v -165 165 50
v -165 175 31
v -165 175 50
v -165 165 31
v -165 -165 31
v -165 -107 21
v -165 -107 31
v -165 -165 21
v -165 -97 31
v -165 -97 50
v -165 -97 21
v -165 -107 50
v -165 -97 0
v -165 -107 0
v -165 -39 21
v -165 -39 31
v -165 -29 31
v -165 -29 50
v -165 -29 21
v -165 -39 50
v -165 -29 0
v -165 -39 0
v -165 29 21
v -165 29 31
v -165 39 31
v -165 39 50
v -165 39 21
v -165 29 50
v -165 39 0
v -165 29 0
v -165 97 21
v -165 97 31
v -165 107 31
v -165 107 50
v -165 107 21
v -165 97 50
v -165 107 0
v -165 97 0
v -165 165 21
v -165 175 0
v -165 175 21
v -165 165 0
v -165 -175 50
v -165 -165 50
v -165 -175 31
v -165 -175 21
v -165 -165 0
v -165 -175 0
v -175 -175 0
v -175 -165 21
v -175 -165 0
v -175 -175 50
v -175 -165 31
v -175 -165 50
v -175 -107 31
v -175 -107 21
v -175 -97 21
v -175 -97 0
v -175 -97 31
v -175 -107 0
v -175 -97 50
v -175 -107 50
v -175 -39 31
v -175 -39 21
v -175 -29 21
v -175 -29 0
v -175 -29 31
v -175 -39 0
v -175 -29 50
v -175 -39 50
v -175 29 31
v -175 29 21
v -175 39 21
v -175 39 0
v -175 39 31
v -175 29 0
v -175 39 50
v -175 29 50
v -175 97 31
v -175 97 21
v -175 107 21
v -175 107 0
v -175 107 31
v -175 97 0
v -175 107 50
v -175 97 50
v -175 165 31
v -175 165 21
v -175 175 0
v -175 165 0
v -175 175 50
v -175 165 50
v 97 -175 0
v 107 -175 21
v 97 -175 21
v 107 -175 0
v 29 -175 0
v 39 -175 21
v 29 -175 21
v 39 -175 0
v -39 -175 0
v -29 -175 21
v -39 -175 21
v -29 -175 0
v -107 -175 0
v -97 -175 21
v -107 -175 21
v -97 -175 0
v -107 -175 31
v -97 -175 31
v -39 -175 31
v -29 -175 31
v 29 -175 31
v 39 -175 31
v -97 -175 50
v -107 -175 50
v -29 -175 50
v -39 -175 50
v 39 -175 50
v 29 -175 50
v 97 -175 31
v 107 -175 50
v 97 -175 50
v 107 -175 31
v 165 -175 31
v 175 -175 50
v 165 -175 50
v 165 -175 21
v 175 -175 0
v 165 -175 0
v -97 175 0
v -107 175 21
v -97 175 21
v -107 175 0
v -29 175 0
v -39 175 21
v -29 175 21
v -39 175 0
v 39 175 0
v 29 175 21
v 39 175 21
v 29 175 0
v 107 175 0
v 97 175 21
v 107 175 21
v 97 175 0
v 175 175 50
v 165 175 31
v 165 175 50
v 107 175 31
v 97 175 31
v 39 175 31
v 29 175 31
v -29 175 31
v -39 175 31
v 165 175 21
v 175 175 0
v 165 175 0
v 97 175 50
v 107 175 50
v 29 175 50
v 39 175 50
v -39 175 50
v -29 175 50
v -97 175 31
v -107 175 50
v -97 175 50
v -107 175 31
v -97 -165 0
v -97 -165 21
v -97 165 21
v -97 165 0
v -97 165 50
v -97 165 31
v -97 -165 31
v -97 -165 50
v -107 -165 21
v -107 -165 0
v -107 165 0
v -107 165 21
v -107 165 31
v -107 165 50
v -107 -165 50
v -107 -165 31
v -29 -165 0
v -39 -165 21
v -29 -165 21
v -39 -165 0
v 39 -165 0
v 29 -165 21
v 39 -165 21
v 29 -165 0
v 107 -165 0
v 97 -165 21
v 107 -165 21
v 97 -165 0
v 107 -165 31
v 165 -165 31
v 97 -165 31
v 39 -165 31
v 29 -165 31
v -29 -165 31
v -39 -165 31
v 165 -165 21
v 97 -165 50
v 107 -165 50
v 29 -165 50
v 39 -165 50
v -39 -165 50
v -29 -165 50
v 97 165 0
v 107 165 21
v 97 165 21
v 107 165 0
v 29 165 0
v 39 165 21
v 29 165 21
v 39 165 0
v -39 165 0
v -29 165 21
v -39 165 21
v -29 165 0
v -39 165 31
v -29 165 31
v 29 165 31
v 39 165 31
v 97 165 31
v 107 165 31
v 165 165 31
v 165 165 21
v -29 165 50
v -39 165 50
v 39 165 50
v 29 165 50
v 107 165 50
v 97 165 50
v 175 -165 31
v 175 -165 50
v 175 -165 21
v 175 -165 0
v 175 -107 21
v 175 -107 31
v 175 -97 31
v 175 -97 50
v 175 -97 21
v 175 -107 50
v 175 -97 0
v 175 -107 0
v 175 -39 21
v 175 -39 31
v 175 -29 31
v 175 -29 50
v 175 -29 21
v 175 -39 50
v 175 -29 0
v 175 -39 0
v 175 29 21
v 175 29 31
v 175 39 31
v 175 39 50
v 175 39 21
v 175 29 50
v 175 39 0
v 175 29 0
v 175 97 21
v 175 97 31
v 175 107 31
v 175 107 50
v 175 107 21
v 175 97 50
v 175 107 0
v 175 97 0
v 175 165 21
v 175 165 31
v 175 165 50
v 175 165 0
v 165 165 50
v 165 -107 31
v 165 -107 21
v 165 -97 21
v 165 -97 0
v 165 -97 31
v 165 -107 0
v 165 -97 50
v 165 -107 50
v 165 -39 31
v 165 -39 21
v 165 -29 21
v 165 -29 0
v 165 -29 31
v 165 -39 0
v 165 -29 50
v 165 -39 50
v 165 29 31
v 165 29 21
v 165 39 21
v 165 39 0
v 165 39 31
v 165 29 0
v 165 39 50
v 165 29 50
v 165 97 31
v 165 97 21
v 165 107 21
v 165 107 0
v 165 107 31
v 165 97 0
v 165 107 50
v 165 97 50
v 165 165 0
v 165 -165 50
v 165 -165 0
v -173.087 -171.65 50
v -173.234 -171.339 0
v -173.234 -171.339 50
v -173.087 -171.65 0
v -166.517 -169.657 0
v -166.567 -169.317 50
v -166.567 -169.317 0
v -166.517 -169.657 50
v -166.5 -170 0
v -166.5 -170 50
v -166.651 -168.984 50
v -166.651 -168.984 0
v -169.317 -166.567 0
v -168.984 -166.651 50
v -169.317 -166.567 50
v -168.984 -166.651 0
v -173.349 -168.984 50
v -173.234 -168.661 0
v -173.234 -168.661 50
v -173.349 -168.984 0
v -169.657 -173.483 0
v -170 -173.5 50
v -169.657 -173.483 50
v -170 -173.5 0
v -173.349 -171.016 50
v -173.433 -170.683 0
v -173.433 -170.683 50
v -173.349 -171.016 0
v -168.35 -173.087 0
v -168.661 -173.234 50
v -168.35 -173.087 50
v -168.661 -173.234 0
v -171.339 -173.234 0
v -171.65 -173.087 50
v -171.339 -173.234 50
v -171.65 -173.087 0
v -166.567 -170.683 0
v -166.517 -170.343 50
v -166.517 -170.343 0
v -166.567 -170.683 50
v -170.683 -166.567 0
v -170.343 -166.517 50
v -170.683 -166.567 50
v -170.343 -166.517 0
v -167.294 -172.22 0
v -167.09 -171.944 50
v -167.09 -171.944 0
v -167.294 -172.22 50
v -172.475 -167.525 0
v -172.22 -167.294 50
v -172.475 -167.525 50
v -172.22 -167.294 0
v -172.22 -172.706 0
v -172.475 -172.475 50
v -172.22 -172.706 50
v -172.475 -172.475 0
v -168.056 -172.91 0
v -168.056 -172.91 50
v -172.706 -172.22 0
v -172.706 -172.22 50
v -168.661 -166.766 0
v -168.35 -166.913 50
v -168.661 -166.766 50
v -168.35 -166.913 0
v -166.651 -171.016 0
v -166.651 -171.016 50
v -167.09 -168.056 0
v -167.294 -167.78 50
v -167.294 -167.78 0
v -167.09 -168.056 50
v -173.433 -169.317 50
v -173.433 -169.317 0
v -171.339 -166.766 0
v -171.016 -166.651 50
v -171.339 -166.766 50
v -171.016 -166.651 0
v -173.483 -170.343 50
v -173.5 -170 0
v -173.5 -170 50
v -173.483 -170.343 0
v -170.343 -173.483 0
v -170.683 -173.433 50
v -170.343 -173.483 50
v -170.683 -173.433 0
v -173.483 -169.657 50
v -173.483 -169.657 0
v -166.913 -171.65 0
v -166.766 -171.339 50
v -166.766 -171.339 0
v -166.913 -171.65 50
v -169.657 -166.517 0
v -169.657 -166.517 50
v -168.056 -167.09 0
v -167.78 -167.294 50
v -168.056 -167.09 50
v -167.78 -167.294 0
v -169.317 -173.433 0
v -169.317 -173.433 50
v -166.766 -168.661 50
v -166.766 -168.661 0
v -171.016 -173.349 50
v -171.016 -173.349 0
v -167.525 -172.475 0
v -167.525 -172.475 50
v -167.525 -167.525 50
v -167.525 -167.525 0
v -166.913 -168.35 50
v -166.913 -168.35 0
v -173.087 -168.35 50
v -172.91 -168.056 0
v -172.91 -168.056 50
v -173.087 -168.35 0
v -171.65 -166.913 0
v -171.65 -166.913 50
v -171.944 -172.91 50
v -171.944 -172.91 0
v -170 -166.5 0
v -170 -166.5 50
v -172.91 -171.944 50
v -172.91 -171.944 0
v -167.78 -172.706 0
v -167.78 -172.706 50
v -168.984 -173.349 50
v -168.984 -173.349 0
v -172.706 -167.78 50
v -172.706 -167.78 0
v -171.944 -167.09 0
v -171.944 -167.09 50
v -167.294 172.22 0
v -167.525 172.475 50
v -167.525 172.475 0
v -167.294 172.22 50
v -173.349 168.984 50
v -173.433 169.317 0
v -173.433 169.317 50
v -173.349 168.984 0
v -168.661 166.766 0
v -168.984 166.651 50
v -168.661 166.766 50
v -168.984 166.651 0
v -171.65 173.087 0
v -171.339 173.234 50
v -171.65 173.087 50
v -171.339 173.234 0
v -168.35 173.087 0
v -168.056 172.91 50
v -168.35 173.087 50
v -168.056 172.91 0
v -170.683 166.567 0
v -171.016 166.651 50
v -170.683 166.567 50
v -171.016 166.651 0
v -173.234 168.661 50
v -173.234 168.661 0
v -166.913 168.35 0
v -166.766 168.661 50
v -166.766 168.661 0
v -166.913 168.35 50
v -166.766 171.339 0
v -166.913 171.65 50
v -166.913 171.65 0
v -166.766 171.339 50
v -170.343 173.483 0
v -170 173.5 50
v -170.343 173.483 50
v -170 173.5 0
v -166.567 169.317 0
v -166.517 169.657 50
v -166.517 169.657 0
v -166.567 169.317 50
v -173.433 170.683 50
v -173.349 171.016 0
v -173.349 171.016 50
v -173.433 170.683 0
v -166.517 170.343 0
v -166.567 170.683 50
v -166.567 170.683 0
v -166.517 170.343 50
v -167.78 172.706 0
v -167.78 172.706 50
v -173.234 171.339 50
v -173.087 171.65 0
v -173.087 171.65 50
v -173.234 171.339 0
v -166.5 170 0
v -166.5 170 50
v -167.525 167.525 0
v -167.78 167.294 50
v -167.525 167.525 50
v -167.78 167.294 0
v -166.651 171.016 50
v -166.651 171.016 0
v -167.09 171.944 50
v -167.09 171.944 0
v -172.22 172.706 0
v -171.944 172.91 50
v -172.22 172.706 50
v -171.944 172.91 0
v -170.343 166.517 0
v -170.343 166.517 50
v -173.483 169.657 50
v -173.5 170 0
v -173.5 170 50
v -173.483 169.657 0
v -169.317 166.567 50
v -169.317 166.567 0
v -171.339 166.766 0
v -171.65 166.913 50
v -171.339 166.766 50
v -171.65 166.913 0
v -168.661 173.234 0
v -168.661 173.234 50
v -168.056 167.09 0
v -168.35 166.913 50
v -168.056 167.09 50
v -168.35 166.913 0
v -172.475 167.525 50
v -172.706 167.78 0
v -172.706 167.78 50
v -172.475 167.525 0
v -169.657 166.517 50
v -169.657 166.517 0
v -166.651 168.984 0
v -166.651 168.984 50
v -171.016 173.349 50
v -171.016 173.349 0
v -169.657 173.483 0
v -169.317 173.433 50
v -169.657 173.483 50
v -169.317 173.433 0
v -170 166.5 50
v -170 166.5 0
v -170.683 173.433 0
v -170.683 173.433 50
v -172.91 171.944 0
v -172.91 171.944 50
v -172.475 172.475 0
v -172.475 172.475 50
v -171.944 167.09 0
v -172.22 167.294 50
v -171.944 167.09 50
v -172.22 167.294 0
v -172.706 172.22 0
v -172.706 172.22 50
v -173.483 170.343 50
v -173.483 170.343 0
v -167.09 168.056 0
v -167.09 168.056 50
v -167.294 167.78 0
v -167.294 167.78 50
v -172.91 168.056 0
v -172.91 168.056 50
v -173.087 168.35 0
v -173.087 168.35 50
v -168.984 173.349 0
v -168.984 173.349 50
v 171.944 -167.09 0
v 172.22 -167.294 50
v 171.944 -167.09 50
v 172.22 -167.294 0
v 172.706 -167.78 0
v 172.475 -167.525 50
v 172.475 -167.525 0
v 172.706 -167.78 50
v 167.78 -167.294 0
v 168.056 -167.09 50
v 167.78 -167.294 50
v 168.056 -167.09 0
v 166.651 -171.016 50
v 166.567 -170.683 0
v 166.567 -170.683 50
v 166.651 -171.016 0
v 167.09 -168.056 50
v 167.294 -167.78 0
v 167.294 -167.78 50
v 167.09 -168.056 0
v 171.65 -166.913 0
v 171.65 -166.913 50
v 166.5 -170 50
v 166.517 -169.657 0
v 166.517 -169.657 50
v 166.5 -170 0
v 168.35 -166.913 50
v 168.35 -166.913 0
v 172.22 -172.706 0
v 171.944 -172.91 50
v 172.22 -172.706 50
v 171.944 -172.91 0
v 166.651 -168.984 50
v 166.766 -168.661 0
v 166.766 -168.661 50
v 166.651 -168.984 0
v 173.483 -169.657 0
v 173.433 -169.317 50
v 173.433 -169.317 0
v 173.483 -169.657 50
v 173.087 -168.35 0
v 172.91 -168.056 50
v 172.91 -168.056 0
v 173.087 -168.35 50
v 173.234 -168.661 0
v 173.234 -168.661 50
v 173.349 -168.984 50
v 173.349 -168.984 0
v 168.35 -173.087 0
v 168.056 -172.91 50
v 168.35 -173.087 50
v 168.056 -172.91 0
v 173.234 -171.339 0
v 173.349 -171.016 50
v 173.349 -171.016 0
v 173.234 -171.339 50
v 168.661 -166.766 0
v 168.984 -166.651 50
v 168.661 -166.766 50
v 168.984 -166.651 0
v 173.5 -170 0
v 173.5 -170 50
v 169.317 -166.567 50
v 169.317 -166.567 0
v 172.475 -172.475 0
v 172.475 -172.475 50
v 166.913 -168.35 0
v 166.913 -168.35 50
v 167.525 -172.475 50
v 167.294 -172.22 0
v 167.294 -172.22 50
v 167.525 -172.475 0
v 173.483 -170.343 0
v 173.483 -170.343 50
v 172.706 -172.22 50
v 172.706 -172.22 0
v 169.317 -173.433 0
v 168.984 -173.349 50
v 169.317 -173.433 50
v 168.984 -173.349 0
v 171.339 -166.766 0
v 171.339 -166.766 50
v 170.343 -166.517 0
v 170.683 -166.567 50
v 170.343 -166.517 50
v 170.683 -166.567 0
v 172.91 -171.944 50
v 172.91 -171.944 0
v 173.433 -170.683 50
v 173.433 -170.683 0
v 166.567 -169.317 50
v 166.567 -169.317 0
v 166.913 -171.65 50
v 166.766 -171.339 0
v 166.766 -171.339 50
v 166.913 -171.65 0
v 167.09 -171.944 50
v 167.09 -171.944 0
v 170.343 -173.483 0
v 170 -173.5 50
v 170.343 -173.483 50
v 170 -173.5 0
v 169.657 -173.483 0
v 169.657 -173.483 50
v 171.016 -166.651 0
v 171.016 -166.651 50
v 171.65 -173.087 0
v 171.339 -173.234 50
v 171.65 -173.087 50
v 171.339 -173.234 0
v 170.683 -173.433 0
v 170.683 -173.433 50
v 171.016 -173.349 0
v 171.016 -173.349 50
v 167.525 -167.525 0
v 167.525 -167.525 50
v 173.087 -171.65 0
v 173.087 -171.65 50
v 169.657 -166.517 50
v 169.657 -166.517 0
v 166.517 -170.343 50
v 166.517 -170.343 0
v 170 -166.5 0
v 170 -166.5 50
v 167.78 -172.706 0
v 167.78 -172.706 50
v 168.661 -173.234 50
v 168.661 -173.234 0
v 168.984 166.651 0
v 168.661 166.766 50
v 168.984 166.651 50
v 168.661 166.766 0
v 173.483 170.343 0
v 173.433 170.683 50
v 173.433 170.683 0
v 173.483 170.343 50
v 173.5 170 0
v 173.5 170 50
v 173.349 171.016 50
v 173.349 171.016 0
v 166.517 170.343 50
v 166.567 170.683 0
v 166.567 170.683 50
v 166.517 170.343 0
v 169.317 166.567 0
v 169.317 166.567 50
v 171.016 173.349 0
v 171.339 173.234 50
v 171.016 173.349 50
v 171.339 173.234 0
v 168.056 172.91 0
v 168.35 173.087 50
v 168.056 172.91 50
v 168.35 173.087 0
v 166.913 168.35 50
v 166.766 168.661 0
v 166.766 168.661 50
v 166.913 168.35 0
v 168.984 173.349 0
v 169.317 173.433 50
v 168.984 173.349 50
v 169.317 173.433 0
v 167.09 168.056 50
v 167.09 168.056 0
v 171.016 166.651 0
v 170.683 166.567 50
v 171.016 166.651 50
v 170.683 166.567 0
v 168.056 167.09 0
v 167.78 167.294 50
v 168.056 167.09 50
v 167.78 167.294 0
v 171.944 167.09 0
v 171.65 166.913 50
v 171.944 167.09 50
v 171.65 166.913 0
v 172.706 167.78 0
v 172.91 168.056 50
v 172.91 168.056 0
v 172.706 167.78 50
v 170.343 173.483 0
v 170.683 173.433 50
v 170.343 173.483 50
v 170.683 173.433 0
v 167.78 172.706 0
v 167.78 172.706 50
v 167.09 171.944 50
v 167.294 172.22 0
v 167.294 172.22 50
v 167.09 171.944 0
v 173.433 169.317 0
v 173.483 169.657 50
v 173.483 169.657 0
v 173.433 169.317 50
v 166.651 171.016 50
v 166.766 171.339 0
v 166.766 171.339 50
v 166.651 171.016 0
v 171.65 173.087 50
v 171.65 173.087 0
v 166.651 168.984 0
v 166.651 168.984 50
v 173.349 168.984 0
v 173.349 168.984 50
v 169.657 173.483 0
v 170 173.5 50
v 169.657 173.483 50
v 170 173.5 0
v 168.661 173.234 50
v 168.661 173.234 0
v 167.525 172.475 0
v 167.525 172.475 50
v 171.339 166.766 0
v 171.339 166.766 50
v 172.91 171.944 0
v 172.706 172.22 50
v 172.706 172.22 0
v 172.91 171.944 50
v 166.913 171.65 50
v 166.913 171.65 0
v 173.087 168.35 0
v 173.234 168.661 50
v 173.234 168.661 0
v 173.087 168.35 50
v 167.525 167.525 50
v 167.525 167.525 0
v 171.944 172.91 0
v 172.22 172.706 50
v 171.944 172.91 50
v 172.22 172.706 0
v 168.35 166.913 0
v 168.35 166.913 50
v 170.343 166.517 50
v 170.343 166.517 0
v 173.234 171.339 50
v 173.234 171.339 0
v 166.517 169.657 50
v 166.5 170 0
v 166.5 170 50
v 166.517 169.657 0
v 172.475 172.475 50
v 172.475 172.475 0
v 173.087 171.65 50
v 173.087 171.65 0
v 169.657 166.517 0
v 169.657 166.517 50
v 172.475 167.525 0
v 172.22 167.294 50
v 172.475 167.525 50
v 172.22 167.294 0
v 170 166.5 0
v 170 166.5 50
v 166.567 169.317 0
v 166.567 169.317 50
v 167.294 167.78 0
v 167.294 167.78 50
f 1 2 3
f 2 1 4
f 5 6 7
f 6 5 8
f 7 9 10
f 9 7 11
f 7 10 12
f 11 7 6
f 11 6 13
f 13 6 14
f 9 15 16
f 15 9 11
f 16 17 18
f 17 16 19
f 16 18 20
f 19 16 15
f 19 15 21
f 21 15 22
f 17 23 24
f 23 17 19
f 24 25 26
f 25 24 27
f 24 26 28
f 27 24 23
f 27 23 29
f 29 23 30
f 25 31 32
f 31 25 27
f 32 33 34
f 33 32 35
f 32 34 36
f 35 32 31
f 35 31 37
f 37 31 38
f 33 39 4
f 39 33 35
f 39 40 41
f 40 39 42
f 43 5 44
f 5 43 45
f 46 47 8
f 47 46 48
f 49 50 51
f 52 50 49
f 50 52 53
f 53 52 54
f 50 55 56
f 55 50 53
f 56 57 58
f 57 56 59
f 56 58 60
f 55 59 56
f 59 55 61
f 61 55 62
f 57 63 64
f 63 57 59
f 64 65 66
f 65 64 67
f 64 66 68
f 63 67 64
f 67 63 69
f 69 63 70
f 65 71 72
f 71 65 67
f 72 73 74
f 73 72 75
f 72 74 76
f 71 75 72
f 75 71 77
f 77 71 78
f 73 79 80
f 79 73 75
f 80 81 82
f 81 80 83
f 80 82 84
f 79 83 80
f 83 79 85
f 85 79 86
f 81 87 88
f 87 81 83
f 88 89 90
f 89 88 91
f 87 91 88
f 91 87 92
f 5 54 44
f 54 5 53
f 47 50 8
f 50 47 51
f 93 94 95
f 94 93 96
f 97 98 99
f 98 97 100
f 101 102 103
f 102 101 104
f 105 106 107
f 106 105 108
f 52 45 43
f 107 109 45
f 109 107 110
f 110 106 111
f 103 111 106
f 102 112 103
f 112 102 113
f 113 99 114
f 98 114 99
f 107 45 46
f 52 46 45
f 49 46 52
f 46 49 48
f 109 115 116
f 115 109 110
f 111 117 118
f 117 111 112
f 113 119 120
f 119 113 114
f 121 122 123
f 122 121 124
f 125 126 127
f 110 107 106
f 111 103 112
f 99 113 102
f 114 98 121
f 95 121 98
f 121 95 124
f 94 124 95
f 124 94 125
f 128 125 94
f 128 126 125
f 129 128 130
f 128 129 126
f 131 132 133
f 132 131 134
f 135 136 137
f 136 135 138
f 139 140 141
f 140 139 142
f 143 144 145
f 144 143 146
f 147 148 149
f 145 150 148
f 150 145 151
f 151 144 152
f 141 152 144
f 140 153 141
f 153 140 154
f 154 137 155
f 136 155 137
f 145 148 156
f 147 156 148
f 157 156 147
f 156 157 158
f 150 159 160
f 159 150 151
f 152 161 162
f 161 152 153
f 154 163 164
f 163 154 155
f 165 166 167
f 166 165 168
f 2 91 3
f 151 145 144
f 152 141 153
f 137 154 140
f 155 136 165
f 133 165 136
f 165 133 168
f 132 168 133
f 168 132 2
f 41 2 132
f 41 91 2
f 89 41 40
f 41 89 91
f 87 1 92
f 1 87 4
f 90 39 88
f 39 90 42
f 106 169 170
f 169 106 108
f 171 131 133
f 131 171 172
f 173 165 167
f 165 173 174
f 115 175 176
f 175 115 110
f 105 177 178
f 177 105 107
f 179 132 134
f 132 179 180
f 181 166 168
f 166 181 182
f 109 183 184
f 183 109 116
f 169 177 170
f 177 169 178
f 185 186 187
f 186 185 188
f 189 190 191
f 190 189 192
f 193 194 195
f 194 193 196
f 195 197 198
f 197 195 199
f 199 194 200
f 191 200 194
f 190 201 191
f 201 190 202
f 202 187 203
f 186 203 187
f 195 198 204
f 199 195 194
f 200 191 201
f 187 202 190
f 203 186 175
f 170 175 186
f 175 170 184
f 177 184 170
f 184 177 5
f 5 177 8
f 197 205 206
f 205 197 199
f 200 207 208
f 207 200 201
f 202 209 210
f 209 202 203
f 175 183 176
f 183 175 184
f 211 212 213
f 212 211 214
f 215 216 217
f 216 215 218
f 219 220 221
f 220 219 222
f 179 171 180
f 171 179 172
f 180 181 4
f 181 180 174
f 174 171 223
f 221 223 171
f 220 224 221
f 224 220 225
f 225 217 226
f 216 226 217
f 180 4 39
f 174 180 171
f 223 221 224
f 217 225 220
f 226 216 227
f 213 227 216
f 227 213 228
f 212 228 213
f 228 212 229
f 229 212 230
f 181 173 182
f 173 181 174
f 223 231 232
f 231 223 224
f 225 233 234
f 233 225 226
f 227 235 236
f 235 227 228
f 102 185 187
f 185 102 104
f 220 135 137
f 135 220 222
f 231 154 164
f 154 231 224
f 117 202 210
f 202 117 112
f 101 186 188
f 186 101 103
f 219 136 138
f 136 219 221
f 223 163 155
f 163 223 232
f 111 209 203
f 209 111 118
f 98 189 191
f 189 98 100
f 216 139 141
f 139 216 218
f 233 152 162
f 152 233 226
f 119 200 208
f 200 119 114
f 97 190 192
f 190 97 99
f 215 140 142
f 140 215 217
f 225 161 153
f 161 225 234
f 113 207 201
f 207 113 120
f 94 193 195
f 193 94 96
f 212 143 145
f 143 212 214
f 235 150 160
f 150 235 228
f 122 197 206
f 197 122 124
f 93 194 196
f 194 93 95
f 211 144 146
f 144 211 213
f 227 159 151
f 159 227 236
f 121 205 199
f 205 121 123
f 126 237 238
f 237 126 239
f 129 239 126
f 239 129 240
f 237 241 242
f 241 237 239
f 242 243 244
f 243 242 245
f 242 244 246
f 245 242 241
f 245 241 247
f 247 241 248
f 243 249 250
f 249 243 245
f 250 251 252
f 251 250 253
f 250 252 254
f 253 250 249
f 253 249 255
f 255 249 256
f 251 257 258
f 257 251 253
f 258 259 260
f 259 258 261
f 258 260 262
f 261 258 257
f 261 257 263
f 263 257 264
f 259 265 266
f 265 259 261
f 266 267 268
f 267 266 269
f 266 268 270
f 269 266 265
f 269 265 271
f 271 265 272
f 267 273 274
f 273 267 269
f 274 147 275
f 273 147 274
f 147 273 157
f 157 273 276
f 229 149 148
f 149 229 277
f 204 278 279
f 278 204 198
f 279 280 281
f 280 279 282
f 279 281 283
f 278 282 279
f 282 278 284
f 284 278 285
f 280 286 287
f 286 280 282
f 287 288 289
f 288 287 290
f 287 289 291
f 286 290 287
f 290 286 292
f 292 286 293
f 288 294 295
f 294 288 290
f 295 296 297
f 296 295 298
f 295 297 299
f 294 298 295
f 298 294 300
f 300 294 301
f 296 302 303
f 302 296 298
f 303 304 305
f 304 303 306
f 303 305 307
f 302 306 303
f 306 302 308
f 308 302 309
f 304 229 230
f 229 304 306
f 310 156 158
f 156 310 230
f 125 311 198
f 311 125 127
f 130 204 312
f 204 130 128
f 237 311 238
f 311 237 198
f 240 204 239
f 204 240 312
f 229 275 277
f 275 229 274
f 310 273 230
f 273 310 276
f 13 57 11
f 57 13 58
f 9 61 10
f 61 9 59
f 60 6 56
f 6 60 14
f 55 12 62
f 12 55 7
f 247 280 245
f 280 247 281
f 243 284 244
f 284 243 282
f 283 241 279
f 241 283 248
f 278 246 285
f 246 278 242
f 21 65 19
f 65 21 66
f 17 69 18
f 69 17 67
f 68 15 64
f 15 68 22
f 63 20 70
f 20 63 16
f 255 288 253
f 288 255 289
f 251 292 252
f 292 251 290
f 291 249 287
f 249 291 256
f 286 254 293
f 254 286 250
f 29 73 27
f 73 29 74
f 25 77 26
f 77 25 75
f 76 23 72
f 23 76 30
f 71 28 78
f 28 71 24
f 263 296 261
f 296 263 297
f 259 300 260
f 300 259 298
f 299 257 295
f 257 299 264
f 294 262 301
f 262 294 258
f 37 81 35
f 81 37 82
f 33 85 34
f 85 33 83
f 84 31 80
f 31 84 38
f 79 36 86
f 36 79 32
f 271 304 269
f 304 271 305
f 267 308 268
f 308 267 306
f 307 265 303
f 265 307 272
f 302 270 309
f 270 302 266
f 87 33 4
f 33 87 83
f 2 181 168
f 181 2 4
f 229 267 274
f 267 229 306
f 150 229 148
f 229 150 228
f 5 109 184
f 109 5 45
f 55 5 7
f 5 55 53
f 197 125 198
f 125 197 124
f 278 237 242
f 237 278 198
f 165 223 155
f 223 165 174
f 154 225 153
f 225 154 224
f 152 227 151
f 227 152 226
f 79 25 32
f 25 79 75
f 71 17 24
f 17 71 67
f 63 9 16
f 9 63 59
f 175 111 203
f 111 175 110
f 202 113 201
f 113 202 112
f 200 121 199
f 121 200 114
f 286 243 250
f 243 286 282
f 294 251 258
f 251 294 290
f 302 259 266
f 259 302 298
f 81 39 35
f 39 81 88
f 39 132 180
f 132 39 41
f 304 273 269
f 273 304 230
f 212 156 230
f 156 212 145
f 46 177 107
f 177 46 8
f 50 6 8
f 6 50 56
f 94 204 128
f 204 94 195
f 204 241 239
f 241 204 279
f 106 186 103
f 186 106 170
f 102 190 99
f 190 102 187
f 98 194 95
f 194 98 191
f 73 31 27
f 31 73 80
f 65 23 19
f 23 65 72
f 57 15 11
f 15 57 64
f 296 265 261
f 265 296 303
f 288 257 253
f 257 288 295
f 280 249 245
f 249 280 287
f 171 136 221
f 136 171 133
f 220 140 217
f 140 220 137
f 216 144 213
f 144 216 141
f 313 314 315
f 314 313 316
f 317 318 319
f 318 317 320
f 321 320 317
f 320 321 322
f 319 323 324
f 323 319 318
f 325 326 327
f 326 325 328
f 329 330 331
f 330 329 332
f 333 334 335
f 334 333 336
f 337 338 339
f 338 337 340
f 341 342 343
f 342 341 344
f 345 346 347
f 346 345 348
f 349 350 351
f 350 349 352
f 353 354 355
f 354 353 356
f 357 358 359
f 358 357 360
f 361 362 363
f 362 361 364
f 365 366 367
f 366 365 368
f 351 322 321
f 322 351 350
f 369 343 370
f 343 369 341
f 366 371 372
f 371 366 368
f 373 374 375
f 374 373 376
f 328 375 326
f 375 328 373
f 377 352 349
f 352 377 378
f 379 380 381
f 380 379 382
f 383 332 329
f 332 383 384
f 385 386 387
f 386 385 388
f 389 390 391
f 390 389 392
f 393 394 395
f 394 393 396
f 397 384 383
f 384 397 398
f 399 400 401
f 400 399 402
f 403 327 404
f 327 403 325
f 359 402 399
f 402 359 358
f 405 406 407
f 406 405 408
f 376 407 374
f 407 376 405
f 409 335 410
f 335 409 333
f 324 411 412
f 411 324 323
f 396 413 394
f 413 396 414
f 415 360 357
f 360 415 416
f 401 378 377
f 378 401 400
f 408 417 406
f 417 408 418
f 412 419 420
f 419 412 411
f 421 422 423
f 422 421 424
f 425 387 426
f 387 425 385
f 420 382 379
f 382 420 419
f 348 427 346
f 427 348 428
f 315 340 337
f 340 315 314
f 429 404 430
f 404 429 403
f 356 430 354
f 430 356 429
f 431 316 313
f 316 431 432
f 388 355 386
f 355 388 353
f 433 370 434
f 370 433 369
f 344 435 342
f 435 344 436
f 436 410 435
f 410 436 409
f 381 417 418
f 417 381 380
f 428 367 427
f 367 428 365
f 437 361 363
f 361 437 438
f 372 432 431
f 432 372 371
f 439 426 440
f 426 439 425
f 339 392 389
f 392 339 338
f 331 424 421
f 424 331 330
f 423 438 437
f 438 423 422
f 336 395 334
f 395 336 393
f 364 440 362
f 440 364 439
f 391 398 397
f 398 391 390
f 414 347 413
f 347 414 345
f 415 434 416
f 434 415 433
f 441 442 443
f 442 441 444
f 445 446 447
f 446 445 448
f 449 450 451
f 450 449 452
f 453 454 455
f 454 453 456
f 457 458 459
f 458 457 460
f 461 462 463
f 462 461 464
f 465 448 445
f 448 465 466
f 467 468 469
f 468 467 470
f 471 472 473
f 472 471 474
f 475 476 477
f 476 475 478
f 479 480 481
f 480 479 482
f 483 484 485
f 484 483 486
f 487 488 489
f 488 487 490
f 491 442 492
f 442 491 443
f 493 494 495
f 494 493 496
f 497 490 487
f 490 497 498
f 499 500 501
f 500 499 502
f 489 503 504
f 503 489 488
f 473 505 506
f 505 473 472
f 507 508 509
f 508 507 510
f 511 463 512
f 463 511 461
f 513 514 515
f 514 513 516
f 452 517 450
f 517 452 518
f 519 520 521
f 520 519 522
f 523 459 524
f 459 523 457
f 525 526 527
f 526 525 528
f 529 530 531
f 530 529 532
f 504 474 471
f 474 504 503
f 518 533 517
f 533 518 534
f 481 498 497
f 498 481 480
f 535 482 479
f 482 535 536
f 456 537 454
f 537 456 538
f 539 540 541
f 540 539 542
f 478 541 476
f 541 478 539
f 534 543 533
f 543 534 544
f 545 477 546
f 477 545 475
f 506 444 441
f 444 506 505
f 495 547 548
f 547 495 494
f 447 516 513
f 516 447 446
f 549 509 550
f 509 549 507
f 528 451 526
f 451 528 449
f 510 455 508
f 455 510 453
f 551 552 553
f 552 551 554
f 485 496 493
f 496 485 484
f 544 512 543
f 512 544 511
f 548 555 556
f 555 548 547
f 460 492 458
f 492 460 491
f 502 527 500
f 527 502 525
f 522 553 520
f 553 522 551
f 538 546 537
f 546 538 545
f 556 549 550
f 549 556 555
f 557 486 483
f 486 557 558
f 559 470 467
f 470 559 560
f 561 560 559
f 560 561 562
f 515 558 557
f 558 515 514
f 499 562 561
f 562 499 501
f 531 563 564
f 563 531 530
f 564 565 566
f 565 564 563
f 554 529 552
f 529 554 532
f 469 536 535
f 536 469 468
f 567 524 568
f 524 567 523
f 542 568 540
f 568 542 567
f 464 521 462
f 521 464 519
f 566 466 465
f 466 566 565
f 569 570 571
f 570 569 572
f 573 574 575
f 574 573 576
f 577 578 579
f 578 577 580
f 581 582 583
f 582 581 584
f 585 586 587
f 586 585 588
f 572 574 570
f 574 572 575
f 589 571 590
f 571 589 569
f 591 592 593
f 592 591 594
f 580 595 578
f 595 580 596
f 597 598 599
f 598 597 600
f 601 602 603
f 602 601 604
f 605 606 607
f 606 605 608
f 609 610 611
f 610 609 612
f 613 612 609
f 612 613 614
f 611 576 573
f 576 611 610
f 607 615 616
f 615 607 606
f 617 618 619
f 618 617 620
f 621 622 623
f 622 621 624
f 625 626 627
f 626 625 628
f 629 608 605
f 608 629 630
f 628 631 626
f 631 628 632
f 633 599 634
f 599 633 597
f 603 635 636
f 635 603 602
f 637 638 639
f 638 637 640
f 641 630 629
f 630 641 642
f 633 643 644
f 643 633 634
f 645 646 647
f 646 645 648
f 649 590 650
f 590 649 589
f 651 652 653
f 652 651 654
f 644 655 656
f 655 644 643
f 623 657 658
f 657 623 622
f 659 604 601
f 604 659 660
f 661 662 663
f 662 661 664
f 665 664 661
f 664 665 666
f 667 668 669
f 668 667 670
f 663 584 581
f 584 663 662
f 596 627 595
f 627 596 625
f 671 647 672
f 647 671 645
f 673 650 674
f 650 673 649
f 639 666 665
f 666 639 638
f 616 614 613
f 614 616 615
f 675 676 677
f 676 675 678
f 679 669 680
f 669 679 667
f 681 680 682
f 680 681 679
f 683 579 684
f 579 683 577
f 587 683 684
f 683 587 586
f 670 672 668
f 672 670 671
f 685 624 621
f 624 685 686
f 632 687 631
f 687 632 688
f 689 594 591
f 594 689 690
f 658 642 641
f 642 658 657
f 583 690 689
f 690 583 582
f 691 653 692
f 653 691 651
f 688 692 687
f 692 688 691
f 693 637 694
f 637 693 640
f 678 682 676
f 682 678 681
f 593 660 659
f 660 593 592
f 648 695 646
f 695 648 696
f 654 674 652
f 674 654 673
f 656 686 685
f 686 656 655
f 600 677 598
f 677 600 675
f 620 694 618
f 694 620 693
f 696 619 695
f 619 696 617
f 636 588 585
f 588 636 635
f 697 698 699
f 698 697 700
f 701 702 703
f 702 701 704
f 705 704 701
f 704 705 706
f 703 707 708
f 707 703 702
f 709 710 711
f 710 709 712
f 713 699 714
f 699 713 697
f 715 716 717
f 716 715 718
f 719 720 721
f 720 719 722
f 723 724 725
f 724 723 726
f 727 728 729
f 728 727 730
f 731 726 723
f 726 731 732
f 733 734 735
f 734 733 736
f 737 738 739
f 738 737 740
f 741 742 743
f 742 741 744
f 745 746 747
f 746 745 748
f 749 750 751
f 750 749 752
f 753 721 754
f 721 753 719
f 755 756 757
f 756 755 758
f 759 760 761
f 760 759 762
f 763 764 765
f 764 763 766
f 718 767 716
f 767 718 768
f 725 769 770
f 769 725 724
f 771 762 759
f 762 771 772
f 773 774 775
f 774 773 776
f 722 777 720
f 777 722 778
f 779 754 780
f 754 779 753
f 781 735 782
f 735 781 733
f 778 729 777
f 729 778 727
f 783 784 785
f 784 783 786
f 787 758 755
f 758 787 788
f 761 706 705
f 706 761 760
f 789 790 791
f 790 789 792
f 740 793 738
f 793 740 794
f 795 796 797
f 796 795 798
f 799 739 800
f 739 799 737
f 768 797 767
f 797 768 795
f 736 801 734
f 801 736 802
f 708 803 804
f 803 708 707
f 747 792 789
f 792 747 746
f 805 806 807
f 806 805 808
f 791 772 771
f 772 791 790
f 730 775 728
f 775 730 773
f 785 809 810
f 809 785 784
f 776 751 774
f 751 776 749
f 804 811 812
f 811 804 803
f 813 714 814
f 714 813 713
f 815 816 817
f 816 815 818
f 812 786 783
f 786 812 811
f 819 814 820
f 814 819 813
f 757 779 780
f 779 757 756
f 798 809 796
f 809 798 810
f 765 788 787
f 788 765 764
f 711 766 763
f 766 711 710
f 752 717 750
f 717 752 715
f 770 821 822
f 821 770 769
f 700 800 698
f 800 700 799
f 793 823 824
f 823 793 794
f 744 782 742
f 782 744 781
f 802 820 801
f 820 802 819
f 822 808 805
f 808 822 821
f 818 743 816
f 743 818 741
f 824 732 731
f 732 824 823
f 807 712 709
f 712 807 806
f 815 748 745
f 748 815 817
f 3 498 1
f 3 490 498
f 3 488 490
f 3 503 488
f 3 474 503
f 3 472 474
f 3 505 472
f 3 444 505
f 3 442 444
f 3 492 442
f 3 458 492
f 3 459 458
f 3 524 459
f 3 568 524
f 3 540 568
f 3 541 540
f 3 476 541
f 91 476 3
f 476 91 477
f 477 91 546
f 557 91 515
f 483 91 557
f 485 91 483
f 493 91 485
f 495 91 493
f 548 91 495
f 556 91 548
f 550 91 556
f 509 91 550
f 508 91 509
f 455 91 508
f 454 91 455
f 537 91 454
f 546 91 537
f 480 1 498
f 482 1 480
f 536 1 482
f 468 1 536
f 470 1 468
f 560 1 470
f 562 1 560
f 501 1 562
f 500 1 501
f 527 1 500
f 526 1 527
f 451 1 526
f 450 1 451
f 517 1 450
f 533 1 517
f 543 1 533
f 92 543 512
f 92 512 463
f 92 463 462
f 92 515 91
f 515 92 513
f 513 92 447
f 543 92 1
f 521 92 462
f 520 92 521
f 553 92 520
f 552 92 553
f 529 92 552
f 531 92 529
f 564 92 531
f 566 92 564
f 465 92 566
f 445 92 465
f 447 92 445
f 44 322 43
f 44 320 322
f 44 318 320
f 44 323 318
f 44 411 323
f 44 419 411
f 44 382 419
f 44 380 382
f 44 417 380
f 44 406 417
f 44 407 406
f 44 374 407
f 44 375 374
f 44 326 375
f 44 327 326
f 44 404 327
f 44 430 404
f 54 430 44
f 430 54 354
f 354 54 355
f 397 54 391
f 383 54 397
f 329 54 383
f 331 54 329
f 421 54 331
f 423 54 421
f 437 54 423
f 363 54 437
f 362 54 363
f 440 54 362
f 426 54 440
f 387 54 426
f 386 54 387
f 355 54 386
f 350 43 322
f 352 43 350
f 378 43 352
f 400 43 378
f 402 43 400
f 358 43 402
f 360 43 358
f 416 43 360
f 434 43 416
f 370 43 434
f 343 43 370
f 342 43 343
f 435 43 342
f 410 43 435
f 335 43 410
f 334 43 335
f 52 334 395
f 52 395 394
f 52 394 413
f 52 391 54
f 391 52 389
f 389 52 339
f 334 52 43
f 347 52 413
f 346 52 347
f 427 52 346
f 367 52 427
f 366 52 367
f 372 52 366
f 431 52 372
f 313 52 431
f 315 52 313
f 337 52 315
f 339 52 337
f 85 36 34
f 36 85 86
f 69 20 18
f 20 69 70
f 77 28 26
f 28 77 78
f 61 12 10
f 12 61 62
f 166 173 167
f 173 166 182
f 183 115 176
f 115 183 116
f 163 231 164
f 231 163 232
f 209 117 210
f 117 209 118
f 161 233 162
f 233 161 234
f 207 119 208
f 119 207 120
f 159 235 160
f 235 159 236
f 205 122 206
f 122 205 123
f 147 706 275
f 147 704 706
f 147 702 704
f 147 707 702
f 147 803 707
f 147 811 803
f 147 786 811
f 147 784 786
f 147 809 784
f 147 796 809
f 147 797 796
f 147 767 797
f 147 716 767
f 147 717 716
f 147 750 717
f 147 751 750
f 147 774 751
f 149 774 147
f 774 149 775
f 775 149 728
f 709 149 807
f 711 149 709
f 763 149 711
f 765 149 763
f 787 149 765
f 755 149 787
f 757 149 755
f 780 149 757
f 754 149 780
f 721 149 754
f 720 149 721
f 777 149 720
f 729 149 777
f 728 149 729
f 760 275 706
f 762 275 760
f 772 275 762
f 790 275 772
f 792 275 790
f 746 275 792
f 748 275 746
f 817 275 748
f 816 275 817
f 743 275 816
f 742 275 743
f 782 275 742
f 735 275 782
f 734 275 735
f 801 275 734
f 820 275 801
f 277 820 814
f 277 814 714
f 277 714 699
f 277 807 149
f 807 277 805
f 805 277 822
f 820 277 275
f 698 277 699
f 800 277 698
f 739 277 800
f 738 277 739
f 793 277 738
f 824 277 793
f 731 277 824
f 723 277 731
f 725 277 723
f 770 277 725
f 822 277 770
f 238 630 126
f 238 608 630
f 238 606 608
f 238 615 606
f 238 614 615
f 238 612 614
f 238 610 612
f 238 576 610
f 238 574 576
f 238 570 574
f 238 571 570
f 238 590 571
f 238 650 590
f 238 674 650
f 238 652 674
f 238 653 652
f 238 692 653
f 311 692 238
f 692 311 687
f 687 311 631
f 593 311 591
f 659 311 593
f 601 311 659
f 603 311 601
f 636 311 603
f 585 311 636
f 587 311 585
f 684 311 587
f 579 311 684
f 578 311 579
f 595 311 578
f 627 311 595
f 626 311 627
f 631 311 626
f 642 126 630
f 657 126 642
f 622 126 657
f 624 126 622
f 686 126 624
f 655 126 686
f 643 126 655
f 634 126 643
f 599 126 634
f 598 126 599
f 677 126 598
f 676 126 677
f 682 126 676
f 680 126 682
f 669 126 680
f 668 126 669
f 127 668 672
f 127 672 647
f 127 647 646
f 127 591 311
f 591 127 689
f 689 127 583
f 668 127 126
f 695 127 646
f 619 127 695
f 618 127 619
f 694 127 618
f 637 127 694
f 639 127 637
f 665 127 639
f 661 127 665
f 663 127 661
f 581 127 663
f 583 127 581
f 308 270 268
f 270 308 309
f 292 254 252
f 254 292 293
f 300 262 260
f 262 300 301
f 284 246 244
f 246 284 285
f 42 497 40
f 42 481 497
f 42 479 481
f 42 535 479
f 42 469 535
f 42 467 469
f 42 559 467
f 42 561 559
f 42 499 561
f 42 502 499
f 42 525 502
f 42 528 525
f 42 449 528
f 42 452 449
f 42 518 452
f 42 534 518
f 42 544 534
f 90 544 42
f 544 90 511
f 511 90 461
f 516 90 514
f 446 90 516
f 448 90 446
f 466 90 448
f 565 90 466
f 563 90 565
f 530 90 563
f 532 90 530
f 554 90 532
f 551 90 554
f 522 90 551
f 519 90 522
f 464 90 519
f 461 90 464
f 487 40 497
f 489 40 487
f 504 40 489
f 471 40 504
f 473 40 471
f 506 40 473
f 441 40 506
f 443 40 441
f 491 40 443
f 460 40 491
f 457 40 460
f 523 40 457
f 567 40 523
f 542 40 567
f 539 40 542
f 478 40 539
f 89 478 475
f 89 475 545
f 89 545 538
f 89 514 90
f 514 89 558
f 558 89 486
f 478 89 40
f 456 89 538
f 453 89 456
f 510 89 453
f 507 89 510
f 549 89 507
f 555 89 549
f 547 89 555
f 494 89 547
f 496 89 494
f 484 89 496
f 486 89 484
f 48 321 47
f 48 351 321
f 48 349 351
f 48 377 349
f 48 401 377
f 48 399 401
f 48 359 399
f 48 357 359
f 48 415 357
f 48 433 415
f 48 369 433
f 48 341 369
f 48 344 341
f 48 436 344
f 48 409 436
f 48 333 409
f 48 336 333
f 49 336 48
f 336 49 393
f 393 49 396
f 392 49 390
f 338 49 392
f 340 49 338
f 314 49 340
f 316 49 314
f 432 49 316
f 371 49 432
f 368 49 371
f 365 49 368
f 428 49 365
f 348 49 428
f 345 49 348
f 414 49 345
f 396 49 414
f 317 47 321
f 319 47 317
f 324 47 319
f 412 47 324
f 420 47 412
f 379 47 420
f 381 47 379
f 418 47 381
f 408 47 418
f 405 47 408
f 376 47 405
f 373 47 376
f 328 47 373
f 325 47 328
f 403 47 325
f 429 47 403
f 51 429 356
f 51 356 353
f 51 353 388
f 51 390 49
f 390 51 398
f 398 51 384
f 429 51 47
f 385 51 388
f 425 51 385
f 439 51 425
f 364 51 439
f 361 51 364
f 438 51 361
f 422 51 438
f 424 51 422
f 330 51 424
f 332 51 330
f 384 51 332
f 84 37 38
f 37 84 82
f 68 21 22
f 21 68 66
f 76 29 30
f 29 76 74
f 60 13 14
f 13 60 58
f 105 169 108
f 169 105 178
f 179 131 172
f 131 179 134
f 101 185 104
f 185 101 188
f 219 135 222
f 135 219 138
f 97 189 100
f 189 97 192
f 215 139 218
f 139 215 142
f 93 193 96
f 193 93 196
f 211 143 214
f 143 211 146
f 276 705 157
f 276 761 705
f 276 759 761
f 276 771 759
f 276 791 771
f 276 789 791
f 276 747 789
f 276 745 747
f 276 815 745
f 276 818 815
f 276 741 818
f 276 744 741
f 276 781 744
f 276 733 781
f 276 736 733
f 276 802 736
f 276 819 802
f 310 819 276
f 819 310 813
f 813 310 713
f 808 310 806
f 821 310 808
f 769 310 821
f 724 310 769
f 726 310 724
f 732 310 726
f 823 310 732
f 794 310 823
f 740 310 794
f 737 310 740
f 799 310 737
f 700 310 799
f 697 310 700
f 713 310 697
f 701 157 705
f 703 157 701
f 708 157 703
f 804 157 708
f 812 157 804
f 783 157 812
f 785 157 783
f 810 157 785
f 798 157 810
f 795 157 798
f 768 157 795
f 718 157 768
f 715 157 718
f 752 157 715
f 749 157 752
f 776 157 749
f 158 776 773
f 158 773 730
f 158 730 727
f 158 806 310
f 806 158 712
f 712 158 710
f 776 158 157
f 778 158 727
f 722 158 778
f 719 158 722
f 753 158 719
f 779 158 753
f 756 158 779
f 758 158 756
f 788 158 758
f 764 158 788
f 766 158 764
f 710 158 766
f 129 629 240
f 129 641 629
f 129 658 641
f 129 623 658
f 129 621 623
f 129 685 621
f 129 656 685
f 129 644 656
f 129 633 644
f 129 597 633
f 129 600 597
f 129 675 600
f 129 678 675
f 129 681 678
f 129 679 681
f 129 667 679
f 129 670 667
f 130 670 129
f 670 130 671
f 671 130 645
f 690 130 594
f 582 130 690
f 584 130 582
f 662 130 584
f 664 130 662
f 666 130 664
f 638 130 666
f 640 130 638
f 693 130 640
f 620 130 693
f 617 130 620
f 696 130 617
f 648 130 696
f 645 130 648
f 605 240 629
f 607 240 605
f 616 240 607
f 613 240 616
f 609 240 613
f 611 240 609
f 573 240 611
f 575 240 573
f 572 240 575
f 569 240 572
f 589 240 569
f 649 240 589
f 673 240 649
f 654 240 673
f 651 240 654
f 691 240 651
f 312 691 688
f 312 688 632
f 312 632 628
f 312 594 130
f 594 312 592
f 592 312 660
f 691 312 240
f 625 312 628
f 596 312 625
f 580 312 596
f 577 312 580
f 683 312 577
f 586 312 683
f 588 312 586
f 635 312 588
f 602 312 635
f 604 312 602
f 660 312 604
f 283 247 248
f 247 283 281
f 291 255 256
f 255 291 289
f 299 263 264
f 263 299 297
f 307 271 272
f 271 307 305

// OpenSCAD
// Cage slice - index 12
bar = 10;
outer = 350;
half = outer / 2;
height = 700;

N_xy = 6;
N_z  = 11;

x_spacing = (outer - bar) / (N_xy - 1);
z_spacing = (height - bar) / (N_z  - 1);

xs = [ for (i = [0 : N_xy - 1]) (-half + bar/2 + i * x_spacing) ];
ys = xs;

zs = [ for (k = [0 : N_z - 1]) (bar/2 + k * z_spacing) ];

$fn = 64;

module cage_bars() {
    union() {
        // Vertical bars on front and back faces
        for (xv = xs) {
            translate([xv, -half + bar/2, height/2])
                cube([bar, bar, height], center = true);
            translate([xv,  half - bar/2, height/2])
                cube([bar, bar, height], center = true);
        }

        // Vertical bars on left and right faces
        for (yv = ys) {
            translate([-half + bar/2, yv, height/2])
                cube([bar, bar, height], center = true);
            translate([ half - bar/2, yv, height/2])
                cube([bar, bar, height], center = true);
        }

        // Horizontal x-bars on front and back faces
        for (zv = zs) {
            translate([0, -half + bar/2, zv])
                cube([outer, bar, bar], center = true);
            translate([0,  half - bar/2, zv])
                cube([outer, bar, bar], center = true);
        }

        // Horizontal y-bars on left and right faces
        for (zv = zs) {
            translate([-half + bar/2, 0, zv])
                cube([bar, outer, bar], center = true);
            translate([ half - bar/2, 0, zv])
                cube([bar, outer, bar], center = true);
        }

        // Floor and ceiling extra x-bars at all y positions
        z_floor = bar/2;
        z_ceil  = height - bar/2;
        for (yv = ys) {
            translate([0, yv, z_floor])
                cube([outer, bar, bar], center = true);
            translate([0, yv, z_ceil])
                cube([outer, bar, bar], center = true);
        }

        // Floor and ceiling extra y-bars at all x positions
        for (xv = xs) {
            translate([xv, 0, z_floor])
                cube([bar, outer, bar], center = true);
            translate([xv, 0, z_ceil])
                cube([bar, outer, bar], center = true);
        }
    }
}

module corner_holes() {
    hole_d = 7;
    for (sx = [-1, 1])
        for (sy = [-1, 1])
            translate([sx * (half - bar/2), sy * (half - bar/2), height/2])
                cylinder(h = height + 2, d = hole_d, center = true);
}

module cage_full() {
    difference() {
        cage_bars();
        corner_holes();
    }
}

slice_index = 12;
slice_height = 50;

module cage_slice() {
    translate([0, 0, -slice_index * slice_height]) {
        intersection() {
            cage_full();
            translate([0, 0, slice_index * slice_height + slice_height/2])
                cube([outer + 20, outer + 20, slice_height], center = true);
        }
    }
}

cage_slice();
